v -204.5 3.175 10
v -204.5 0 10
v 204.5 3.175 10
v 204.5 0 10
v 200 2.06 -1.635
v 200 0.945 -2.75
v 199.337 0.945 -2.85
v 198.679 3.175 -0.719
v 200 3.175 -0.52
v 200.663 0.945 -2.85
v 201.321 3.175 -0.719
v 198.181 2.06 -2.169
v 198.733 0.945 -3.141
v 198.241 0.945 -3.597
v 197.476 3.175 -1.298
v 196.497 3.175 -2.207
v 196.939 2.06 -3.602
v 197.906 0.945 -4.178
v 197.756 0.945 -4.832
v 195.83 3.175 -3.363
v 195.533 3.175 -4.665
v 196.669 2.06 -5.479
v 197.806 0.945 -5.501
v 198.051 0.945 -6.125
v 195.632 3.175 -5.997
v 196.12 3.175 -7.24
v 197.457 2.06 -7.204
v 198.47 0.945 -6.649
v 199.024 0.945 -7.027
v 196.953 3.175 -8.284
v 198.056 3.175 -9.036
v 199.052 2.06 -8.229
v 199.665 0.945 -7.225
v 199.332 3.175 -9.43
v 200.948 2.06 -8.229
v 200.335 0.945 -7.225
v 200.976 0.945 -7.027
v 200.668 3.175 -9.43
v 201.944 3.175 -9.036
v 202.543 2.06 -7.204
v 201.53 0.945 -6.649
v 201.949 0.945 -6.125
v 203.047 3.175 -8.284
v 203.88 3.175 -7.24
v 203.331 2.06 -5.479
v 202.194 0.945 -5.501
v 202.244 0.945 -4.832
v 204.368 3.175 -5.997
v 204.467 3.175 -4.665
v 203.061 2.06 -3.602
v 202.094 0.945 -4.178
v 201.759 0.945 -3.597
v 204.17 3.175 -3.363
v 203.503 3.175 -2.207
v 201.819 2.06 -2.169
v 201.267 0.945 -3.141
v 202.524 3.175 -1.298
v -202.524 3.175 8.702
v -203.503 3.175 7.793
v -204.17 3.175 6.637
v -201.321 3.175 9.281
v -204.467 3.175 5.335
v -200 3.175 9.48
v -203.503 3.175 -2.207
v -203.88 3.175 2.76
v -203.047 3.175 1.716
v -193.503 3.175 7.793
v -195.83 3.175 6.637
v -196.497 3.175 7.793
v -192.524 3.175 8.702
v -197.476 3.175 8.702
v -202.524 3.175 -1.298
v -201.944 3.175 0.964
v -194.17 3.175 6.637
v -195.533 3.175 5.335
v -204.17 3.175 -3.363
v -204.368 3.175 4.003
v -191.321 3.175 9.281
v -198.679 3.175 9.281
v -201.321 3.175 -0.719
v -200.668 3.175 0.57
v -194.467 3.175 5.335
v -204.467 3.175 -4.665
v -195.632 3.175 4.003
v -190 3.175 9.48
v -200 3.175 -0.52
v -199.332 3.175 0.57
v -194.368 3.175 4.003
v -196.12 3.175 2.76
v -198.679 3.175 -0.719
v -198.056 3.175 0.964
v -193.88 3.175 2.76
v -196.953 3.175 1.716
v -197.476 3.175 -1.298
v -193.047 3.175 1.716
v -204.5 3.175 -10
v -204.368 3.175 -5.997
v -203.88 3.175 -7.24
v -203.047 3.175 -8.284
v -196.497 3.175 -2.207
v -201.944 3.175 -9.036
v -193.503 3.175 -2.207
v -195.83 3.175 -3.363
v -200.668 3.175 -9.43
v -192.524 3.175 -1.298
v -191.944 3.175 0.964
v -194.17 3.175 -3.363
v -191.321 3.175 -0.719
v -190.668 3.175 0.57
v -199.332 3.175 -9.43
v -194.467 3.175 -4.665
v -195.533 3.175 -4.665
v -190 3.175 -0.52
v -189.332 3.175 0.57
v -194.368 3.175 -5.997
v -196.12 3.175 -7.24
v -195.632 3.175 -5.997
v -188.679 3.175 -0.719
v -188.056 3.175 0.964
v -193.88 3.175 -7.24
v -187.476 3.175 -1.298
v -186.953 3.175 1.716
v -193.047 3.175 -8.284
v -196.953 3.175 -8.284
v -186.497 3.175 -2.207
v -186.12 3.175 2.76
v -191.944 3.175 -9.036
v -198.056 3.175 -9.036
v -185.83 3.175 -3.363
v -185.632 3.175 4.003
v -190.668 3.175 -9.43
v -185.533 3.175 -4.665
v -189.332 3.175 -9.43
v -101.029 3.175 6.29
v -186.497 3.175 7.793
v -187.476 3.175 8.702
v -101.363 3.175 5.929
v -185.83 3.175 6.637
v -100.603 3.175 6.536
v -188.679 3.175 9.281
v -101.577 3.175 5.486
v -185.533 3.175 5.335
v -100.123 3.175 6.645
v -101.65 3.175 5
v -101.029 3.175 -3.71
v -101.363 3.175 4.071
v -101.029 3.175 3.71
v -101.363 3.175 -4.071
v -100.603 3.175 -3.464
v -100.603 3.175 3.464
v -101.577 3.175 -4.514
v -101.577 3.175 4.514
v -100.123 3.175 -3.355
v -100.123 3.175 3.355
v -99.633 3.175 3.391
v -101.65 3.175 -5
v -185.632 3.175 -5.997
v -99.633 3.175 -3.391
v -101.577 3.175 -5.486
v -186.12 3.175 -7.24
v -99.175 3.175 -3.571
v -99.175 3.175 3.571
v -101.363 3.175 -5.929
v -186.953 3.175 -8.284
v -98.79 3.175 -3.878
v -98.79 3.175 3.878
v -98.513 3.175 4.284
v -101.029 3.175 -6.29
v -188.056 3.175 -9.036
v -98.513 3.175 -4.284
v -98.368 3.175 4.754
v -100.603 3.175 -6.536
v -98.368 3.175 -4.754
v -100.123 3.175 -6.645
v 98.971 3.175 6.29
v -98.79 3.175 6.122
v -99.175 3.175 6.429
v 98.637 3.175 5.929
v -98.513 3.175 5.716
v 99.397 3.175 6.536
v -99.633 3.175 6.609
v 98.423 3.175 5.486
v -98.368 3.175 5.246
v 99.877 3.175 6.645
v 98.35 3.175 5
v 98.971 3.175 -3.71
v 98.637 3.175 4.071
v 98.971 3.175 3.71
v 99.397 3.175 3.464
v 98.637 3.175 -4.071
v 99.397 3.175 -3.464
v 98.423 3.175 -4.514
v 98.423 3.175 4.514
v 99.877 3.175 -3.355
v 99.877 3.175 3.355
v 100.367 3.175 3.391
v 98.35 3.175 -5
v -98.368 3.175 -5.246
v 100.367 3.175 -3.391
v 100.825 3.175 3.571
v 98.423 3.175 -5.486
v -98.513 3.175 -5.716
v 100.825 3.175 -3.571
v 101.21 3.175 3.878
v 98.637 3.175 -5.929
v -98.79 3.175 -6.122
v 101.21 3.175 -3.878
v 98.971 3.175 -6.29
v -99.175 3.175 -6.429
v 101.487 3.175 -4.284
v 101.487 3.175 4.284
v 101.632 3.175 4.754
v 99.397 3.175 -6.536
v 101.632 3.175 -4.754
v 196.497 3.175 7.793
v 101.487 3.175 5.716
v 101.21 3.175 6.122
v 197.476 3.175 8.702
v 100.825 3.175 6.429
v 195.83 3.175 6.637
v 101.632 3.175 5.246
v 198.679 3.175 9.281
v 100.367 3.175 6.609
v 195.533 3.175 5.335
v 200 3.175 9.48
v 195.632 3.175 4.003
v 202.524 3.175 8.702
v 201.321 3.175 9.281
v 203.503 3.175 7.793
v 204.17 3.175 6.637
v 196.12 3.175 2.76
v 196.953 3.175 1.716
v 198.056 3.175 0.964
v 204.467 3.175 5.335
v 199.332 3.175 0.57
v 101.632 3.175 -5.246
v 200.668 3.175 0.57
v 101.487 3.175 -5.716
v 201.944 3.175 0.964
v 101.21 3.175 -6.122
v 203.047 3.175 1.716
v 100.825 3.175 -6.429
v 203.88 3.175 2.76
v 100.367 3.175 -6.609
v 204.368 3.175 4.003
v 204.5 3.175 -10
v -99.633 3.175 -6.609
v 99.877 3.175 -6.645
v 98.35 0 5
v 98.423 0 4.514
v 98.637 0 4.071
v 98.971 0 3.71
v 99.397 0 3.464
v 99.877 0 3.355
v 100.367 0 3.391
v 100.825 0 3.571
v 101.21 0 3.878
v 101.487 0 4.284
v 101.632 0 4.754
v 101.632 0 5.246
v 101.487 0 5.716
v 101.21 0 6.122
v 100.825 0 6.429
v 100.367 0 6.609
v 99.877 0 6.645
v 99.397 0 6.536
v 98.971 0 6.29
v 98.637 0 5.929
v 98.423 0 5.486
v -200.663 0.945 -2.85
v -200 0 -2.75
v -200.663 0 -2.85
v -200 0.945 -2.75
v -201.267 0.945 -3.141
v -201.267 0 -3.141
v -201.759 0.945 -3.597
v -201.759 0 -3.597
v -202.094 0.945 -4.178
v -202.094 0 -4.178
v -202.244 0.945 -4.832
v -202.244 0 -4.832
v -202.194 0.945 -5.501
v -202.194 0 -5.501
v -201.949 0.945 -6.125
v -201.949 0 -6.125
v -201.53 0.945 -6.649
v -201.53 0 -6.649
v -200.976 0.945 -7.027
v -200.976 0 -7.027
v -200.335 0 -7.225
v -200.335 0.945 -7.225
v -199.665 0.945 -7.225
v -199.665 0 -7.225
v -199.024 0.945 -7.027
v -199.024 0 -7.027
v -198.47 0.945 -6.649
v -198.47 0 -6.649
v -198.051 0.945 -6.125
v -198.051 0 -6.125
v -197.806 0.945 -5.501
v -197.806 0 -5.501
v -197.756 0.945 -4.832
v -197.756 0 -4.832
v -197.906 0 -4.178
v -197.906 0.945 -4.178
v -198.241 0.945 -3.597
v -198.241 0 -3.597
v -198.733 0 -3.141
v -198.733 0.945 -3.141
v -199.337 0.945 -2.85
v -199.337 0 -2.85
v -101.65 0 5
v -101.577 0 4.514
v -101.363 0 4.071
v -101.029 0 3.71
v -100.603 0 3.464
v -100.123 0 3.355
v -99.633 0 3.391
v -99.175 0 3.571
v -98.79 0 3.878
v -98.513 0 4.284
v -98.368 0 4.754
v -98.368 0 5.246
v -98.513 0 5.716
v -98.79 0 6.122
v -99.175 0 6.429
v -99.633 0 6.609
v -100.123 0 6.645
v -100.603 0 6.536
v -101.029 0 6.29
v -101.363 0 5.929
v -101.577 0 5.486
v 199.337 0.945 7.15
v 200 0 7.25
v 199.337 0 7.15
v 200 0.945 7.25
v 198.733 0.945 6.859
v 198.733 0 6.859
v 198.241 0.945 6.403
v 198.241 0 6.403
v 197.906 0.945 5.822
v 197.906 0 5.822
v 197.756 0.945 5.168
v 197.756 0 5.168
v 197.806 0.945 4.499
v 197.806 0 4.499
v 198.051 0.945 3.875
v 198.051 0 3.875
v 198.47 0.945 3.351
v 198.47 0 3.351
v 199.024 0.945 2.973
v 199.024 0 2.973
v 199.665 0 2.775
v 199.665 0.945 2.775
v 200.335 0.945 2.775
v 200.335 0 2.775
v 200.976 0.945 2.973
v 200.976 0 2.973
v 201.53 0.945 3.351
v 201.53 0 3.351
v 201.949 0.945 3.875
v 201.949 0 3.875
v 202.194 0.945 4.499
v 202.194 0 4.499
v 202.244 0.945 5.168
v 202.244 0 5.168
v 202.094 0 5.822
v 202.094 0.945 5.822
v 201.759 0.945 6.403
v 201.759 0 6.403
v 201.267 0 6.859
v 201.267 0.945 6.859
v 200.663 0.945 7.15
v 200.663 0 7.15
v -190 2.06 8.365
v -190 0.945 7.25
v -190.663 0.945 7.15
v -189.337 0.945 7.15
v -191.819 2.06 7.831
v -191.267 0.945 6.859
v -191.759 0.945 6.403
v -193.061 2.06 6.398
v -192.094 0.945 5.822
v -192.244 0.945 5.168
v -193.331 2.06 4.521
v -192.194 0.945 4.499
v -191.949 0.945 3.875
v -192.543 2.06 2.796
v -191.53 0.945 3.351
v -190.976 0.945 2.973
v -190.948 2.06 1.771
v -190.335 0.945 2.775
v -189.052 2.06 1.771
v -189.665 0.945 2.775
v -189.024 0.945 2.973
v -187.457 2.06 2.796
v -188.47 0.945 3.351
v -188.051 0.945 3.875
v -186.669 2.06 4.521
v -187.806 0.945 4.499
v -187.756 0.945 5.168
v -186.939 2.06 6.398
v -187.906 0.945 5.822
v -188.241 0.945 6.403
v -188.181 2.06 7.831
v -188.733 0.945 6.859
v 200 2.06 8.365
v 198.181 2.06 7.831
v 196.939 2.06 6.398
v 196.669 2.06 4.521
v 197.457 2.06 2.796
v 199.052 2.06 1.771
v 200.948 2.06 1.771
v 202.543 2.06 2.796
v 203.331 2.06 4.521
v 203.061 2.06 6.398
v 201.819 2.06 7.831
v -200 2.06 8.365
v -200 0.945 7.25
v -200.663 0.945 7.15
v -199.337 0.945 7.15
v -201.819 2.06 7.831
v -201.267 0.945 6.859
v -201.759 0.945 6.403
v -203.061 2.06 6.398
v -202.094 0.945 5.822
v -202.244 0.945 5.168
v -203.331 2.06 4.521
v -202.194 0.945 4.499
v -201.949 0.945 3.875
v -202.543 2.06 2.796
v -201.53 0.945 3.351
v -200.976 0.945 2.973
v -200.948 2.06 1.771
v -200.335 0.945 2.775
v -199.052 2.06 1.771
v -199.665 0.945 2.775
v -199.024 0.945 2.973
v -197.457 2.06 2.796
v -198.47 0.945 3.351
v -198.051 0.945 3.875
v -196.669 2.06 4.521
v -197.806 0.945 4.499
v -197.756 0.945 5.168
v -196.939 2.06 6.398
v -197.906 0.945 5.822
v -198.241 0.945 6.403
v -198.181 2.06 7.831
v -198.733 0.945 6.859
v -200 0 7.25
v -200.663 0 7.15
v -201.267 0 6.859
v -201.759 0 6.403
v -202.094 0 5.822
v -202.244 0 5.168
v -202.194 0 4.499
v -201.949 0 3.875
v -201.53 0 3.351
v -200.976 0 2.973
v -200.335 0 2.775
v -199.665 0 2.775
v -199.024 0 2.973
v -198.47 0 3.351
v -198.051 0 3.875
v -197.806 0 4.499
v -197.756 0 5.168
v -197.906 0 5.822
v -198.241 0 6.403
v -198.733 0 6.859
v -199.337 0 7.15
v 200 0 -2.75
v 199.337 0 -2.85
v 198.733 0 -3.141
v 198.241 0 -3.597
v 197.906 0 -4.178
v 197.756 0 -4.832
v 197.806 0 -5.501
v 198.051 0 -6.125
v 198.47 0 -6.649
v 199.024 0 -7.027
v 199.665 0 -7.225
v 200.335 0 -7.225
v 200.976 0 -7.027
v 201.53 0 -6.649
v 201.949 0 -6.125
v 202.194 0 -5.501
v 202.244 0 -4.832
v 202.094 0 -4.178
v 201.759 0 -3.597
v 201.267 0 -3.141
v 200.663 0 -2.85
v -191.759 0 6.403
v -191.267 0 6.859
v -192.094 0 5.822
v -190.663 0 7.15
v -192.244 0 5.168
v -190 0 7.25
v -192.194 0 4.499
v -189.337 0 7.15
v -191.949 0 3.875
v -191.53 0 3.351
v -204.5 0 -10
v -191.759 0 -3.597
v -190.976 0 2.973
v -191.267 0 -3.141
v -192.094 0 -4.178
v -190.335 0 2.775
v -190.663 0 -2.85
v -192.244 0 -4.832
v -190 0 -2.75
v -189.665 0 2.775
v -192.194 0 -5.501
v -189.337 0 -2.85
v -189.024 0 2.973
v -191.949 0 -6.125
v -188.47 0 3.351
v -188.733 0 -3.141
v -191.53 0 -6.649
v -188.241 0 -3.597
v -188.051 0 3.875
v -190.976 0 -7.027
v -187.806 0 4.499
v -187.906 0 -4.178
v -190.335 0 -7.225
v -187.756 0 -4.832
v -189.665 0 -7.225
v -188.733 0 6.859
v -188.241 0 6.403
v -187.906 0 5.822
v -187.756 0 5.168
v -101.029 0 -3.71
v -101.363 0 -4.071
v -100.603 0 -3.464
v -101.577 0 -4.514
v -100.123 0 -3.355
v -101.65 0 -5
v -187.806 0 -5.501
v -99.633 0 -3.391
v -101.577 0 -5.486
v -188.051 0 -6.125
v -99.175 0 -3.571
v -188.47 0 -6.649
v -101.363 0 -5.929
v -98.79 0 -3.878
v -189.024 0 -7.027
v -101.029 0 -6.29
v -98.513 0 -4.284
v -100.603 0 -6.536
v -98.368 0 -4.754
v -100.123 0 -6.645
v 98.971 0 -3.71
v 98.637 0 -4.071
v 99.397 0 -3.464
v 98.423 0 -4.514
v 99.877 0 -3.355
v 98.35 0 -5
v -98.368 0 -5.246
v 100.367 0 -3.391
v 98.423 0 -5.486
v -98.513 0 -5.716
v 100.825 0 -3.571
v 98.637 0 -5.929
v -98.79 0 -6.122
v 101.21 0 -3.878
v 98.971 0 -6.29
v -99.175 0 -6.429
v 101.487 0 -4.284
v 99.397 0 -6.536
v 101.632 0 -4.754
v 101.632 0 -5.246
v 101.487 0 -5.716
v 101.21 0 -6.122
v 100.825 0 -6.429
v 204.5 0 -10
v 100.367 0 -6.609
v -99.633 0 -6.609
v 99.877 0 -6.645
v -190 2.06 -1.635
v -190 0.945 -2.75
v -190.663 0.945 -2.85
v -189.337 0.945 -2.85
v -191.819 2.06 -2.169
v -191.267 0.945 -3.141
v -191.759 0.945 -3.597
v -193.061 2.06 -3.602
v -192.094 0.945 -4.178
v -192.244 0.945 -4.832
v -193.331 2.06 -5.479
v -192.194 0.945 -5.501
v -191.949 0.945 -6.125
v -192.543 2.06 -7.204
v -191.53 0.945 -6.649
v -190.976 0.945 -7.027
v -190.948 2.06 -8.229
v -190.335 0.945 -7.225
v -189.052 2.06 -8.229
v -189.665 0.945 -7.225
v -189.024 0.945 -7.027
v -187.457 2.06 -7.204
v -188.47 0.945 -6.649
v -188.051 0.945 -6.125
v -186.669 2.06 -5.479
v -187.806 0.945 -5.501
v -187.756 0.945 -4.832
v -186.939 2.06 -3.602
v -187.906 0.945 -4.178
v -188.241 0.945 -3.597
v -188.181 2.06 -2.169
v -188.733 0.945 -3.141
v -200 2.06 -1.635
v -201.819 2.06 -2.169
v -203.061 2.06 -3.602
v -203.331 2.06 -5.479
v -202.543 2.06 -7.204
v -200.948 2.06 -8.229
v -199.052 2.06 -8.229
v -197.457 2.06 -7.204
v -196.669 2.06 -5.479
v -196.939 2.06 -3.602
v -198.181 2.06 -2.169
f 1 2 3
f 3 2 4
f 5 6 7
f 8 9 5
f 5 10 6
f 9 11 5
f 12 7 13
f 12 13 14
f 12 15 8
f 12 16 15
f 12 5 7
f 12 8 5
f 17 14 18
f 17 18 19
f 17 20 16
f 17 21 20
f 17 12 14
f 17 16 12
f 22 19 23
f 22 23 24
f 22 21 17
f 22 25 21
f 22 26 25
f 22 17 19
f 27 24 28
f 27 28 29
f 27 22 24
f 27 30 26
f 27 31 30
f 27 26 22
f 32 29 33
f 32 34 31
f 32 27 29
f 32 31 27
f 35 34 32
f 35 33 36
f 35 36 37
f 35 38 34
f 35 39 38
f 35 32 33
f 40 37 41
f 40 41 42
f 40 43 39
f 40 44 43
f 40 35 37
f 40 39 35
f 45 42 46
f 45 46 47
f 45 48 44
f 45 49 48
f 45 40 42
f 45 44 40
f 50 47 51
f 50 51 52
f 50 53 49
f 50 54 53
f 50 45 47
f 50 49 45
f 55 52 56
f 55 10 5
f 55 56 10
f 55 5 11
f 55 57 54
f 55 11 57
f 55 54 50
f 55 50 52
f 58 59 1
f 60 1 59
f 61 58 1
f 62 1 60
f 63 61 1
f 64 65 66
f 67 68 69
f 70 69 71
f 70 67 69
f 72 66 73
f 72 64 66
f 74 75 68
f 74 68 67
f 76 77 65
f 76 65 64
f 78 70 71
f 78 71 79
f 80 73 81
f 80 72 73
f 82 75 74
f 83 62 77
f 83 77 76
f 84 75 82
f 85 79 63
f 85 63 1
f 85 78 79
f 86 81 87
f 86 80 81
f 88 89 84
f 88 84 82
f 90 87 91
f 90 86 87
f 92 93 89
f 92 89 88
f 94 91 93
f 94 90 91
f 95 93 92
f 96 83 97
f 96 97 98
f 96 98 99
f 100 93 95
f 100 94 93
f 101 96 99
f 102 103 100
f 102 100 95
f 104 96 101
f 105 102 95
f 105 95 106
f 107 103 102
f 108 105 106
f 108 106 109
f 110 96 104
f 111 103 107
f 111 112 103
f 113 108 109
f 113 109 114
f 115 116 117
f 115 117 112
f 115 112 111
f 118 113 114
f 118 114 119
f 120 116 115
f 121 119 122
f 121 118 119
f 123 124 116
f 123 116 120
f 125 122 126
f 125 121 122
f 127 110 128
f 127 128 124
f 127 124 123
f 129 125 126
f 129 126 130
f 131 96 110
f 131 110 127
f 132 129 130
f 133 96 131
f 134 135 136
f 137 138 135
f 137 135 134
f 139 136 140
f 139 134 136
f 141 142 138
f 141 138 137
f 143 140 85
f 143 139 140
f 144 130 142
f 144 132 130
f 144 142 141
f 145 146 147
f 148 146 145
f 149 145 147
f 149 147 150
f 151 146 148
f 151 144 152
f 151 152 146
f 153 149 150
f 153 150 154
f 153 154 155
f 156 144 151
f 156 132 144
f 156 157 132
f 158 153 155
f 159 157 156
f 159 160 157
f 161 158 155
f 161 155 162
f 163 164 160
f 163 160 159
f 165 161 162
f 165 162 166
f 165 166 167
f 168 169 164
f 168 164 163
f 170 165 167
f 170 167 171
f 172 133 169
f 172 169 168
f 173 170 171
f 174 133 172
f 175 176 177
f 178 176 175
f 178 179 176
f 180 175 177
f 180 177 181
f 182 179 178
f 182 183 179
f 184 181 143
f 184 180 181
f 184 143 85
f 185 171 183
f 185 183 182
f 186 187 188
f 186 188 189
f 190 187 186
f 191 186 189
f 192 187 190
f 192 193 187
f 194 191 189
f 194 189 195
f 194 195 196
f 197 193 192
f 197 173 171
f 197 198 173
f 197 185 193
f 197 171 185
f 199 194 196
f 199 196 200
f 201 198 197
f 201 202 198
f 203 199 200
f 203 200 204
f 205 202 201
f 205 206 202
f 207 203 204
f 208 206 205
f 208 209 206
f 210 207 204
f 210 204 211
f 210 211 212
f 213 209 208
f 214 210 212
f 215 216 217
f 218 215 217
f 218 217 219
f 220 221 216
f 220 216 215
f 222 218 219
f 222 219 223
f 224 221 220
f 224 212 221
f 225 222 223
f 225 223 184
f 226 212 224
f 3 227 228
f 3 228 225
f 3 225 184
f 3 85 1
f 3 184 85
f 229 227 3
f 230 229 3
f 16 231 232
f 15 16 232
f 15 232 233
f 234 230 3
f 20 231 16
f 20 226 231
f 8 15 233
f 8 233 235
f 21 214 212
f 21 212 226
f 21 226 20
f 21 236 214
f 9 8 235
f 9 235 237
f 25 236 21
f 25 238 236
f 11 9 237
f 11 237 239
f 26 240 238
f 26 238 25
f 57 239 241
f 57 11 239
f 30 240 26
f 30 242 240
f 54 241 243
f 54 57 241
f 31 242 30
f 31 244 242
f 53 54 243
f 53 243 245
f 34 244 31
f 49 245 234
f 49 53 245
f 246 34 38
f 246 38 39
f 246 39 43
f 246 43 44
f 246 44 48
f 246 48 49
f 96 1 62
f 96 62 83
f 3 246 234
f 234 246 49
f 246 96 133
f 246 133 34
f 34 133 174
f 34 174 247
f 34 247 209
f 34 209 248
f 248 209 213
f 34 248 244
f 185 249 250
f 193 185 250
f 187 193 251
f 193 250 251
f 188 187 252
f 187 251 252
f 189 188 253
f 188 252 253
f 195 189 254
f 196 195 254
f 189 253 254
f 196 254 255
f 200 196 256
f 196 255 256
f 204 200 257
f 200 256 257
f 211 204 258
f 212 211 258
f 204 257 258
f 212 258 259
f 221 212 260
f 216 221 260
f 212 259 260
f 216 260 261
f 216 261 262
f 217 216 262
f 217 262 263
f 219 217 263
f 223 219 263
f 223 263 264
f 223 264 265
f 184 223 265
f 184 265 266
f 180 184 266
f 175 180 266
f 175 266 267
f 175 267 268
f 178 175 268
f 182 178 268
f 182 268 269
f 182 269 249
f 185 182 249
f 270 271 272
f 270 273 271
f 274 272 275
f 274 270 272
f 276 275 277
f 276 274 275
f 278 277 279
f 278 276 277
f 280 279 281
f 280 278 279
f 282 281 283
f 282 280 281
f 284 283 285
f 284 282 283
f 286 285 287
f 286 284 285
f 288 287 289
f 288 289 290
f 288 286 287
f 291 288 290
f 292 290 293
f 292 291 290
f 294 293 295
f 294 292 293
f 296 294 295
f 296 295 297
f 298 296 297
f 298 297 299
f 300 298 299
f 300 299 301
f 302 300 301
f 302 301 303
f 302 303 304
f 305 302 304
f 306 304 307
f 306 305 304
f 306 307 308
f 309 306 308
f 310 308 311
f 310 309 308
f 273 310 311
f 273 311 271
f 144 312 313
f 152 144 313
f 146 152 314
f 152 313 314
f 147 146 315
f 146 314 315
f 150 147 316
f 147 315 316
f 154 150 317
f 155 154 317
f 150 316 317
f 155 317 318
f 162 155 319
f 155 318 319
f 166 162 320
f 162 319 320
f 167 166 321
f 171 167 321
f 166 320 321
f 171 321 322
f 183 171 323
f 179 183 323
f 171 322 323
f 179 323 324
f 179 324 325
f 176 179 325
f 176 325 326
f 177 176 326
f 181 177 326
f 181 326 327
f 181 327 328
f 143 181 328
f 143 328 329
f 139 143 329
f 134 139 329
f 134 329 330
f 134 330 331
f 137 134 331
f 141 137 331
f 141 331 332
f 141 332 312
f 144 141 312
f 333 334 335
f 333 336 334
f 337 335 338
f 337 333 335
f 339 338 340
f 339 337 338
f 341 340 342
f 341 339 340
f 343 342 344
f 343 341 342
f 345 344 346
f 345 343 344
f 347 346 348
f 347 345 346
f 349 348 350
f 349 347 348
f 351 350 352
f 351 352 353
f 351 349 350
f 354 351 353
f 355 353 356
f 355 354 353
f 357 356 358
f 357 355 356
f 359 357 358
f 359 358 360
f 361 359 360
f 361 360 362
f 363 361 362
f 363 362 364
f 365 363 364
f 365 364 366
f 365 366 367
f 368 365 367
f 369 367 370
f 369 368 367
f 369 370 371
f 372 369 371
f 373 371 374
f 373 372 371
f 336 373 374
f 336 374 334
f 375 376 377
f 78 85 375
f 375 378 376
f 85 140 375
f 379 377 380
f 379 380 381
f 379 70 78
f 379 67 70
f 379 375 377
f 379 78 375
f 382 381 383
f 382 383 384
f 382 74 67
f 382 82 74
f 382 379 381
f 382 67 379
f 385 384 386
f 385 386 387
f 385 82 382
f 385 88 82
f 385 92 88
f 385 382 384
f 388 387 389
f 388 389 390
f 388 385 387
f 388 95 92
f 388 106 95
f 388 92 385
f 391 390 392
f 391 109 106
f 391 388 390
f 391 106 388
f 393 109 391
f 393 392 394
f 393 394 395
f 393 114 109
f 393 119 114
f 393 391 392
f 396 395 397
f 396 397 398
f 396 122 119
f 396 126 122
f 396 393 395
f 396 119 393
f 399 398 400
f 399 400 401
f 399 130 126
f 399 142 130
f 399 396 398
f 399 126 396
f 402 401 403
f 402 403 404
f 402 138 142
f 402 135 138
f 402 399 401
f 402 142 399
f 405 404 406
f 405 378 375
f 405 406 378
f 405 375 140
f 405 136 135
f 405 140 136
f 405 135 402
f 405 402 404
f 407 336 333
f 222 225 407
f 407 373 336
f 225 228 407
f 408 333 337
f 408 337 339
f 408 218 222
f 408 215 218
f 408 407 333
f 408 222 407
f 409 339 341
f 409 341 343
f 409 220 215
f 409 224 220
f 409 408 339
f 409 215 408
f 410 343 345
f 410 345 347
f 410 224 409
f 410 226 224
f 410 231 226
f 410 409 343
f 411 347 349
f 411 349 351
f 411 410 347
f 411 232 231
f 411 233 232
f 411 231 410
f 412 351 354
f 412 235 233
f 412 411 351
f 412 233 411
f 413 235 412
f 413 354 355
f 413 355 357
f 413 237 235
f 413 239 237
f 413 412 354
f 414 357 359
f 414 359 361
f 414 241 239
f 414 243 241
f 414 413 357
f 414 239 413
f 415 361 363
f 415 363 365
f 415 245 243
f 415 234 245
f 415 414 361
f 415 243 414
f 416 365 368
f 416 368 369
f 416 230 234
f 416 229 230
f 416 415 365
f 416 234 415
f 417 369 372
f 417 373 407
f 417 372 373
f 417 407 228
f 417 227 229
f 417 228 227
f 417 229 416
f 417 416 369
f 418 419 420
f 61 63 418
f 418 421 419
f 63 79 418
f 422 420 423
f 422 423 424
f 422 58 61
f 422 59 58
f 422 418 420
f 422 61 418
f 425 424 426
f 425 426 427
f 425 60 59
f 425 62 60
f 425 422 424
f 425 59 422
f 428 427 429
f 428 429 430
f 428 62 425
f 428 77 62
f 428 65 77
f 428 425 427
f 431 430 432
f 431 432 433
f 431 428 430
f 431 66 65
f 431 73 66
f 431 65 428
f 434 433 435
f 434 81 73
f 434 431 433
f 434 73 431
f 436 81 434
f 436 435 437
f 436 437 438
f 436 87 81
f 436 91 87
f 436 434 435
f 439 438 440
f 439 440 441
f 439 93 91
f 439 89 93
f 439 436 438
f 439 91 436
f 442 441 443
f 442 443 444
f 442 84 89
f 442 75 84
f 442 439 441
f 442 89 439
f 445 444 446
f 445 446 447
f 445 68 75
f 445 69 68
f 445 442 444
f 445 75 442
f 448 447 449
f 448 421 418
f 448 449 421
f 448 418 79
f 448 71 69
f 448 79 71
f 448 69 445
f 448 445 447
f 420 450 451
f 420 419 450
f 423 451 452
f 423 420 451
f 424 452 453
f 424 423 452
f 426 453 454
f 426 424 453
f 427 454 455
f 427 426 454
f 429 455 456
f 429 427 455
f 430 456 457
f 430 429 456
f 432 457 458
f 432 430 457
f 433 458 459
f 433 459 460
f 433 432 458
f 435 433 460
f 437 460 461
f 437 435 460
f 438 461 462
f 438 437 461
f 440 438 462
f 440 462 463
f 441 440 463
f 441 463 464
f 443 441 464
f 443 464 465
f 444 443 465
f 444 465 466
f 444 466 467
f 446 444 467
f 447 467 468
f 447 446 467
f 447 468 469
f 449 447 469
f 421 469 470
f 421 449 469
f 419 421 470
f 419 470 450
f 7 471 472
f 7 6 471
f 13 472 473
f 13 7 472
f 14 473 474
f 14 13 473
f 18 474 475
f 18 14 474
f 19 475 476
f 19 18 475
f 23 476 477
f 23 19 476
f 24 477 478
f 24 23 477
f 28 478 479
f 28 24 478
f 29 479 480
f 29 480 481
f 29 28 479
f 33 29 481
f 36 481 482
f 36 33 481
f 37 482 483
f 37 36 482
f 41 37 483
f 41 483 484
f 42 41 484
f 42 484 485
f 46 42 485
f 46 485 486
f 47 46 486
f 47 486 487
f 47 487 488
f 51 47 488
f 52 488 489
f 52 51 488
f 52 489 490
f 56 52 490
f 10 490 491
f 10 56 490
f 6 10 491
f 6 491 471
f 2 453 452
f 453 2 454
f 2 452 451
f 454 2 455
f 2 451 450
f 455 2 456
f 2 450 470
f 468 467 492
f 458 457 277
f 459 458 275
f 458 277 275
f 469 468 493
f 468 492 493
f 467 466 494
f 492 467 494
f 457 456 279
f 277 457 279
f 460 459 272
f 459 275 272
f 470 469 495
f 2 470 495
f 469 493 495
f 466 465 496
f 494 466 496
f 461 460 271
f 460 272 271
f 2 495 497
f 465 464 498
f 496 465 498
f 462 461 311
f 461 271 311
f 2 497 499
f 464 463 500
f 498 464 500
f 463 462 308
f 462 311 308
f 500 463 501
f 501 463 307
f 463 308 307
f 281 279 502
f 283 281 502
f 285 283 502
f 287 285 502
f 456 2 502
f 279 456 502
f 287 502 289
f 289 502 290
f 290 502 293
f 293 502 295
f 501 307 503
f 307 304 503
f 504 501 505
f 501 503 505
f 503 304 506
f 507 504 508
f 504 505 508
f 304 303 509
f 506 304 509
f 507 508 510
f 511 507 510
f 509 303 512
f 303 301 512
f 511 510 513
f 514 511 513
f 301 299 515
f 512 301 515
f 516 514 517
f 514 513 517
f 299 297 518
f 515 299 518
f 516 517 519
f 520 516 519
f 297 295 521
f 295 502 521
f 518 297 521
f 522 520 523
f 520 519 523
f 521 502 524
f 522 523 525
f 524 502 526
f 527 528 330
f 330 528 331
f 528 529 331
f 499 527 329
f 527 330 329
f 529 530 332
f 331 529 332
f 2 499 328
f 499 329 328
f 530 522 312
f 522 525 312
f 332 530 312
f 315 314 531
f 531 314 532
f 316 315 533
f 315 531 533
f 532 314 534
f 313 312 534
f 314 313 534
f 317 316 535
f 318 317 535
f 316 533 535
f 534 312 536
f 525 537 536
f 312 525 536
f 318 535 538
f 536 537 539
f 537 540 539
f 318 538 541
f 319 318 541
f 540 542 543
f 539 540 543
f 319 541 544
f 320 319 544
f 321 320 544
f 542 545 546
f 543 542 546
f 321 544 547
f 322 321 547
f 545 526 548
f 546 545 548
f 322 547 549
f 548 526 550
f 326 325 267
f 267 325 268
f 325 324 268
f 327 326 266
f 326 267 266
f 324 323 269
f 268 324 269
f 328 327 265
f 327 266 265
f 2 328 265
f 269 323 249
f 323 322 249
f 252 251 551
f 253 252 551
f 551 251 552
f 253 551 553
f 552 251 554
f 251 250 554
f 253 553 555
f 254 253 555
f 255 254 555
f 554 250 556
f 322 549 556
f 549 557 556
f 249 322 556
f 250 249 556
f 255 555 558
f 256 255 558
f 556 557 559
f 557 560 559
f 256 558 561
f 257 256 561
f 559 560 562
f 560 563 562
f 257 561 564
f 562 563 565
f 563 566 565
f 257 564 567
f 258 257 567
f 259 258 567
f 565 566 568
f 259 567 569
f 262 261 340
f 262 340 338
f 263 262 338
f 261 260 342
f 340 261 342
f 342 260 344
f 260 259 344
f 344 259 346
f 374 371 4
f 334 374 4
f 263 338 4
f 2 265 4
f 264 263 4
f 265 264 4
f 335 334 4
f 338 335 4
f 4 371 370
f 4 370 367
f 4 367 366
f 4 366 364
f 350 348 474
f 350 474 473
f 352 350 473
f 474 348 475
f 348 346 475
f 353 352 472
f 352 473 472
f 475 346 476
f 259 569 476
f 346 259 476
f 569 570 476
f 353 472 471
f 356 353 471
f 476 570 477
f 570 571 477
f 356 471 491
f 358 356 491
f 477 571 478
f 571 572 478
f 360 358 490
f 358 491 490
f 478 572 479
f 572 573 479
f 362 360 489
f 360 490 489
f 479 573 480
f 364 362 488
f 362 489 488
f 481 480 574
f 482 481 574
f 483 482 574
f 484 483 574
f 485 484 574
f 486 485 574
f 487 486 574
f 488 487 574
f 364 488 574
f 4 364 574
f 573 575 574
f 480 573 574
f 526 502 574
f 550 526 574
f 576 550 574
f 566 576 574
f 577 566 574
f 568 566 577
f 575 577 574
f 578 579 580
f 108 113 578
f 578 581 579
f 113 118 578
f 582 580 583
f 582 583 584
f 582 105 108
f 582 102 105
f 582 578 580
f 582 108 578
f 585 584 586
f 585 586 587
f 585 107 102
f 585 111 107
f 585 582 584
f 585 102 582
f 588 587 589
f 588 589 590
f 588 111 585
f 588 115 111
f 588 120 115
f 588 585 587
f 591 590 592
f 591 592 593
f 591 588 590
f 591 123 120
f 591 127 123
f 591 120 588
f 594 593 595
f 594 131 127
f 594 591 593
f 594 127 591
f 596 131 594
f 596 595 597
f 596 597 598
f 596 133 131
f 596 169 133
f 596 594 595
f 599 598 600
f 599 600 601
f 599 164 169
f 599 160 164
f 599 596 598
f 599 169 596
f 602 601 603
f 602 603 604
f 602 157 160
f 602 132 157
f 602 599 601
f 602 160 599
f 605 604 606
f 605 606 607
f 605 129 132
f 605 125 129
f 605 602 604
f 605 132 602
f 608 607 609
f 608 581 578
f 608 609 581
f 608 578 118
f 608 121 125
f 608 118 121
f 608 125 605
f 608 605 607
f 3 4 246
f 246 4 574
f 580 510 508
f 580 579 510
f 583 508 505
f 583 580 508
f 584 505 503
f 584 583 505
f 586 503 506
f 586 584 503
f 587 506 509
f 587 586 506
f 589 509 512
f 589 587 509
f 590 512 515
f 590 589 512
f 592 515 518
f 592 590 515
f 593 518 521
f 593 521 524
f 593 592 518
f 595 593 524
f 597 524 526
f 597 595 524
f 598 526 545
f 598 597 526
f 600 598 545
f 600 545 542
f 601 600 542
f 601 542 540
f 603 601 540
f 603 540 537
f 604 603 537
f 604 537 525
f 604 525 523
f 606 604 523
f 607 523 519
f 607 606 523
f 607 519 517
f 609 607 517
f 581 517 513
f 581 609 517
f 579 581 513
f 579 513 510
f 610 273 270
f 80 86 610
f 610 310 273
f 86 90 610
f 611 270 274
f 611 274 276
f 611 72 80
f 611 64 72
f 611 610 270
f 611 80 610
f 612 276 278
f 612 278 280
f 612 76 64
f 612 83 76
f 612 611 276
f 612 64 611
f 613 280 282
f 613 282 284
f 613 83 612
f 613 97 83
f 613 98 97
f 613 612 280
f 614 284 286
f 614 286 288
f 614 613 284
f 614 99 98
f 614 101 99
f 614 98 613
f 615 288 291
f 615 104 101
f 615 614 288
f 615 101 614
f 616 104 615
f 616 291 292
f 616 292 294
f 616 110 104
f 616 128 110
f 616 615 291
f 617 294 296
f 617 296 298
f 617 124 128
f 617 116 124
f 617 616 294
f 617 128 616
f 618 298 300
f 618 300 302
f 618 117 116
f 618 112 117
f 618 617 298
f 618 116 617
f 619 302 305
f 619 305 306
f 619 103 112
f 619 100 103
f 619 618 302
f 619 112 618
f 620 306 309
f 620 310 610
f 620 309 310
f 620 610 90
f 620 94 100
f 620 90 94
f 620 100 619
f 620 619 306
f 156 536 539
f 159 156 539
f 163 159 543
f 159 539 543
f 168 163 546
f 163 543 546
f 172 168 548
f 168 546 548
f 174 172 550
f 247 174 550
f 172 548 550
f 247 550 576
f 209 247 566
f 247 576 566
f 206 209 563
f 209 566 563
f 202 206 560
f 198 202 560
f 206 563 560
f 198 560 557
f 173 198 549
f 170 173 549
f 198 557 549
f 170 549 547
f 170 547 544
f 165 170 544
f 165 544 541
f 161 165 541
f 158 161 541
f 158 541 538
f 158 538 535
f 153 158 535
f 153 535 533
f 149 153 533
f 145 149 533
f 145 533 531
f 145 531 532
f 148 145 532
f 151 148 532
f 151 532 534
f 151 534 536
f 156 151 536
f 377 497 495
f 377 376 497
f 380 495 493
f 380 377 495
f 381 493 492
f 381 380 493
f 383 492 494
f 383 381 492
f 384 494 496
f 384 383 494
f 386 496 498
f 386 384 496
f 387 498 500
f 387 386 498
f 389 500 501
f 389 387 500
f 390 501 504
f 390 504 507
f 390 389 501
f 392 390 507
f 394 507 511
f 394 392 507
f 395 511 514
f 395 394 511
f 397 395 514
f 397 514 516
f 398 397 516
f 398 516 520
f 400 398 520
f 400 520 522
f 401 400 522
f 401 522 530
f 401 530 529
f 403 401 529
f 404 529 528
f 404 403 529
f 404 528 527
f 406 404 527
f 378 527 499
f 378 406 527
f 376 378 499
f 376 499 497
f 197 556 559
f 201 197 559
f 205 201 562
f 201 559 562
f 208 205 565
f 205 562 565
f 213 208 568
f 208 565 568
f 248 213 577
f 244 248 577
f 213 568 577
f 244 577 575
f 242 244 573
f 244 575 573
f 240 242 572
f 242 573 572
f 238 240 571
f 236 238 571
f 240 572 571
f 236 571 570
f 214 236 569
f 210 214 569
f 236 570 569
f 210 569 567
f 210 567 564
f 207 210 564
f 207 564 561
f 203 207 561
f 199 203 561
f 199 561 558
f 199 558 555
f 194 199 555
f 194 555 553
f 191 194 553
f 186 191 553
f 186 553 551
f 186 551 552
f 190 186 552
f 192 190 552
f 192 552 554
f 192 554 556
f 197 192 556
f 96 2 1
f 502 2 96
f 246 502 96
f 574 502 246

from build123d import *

# Parameters (mm, degrees)
SKETCH1_W                    = 409
SKETCH1_H                    = 20
BOSS_EXTRUDE1_DEPTH          = 3.175
CSK_FOR_M4_SFHCS1_AT_2_COUNT = 2
CSK_FOR_M4_SFHCS1_AT_2_PITCH = 14.142135624
CSK_FOR_M4_SFHCS1_AT_3_COUNT = 2
CSK_FOR_M4_SFHCS1_AT_3_PITCH = 10
CSK_FOR_M4_SFHCS1_AT_4_COUNT = 2
CSK_FOR_M4_SFHCS1_AT_4_PITCH = 10
CSK_FOR_M4_SFHCS1_AT_5_COUNT = 2
CSK_FOR_M4_SFHCS1_AT_5_PITCH = 390
CSK_FOR_M4_SFHCS1_AT_6_COUNT = 2
CSK_FOR_M4_SFHCS1_AT_6_PITCH = 390.128184063
M4X0_7_TAPPED_HOLE1_D        = 3.3


with BuildPart() as part:
    # Sketch1 → Boss-Extrude1 (new body)
    with BuildSketch(Plane(origin=(0, 0, 0), x_dir=(1, 0, 0), z_dir=(0, 1, 0))):
        Rectangle(SKETCH1_W, SKETCH1_H)
    extrude(amount=BOSS_EXTRUDE1_DEPTH)

    # Sketch4 → CSK for M4 SFHCS1 (revolve, cut)
    with BuildSketch(Plane(origin=(-190, 3.175, -5), x_dir=(0, 0, 1), z_dir=(1, 0, 0))):
        Polygon((0, 0), (0, 3.175), (2.25, 3.175), (2.25, 2.23), (4.48, 0), align=None)
    csk_for_m4_sfhcs1 = revolve(axis=Axis((-190, 9.525, -5), (0, -1, 0)), mode=Mode.SUBTRACT)

    # CSK for M4 SFHCS1 at 2: CSK for M4 SFHCS1 ×2
    with Locations(*[Vector(-0.7071067811865472, 0, 0.7071067811865479) * (i * CSK_FOR_M4_SFHCS1_AT_2_PITCH) for i in range(1, CSK_FOR_M4_SFHCS1_AT_2_COUNT)]):
        add(csk_for_m4_sfhcs1, mode=Mode.SUBTRACT)

    # CSK for M4 SFHCS1 at 3: CSK for M4 SFHCS1 ×2
    with Locations(*[(-i * CSK_FOR_M4_SFHCS1_AT_3_PITCH, 0, 0) for i in range(1, CSK_FOR_M4_SFHCS1_AT_3_COUNT)]):
        add(csk_for_m4_sfhcs1, mode=Mode.SUBTRACT)

    # CSK for M4 SFHCS1 at 4: CSK for M4 SFHCS1 ×2
    with Locations(*[(0, 0, i * CSK_FOR_M4_SFHCS1_AT_4_PITCH) for i in range(1, CSK_FOR_M4_SFHCS1_AT_4_COUNT)]):
        add(csk_for_m4_sfhcs1, mode=Mode.SUBTRACT)

    # CSK for M4 SFHCS1 at 5: CSK for M4 SFHCS1 ×2
    with Locations(*[(i * CSK_FOR_M4_SFHCS1_AT_5_PITCH, 0, 0) for i in range(1, CSK_FOR_M4_SFHCS1_AT_5_COUNT)]):
        add(csk_for_m4_sfhcs1, mode=Mode.SUBTRACT)

    # CSK for M4 SFHCS1 at 6: CSK for M4 SFHCS1 ×2
    with Locations(*[Vector(0.9996714309094813, 0, 0.025632600792550815) * (i * CSK_FOR_M4_SFHCS1_AT_6_PITCH) for i in range(1, CSK_FOR_M4_SFHCS1_AT_6_COUNT)]):
        add(csk_for_m4_sfhcs1, mode=Mode.SUBTRACT)

    # M4x0.7 Tapped Hole1 (through all)
    with Locations(Plane(origin=(0, 3.175, 0), x_dir=(1, 0, 0), z_dir=(0, 1, 0))):
        with Locations((100, 5), (-100, -5), (-100, 5), (100, -5)):
            Hole(M4X0_7_TAPPED_HOLE1_D / 2)


solid = part.part
